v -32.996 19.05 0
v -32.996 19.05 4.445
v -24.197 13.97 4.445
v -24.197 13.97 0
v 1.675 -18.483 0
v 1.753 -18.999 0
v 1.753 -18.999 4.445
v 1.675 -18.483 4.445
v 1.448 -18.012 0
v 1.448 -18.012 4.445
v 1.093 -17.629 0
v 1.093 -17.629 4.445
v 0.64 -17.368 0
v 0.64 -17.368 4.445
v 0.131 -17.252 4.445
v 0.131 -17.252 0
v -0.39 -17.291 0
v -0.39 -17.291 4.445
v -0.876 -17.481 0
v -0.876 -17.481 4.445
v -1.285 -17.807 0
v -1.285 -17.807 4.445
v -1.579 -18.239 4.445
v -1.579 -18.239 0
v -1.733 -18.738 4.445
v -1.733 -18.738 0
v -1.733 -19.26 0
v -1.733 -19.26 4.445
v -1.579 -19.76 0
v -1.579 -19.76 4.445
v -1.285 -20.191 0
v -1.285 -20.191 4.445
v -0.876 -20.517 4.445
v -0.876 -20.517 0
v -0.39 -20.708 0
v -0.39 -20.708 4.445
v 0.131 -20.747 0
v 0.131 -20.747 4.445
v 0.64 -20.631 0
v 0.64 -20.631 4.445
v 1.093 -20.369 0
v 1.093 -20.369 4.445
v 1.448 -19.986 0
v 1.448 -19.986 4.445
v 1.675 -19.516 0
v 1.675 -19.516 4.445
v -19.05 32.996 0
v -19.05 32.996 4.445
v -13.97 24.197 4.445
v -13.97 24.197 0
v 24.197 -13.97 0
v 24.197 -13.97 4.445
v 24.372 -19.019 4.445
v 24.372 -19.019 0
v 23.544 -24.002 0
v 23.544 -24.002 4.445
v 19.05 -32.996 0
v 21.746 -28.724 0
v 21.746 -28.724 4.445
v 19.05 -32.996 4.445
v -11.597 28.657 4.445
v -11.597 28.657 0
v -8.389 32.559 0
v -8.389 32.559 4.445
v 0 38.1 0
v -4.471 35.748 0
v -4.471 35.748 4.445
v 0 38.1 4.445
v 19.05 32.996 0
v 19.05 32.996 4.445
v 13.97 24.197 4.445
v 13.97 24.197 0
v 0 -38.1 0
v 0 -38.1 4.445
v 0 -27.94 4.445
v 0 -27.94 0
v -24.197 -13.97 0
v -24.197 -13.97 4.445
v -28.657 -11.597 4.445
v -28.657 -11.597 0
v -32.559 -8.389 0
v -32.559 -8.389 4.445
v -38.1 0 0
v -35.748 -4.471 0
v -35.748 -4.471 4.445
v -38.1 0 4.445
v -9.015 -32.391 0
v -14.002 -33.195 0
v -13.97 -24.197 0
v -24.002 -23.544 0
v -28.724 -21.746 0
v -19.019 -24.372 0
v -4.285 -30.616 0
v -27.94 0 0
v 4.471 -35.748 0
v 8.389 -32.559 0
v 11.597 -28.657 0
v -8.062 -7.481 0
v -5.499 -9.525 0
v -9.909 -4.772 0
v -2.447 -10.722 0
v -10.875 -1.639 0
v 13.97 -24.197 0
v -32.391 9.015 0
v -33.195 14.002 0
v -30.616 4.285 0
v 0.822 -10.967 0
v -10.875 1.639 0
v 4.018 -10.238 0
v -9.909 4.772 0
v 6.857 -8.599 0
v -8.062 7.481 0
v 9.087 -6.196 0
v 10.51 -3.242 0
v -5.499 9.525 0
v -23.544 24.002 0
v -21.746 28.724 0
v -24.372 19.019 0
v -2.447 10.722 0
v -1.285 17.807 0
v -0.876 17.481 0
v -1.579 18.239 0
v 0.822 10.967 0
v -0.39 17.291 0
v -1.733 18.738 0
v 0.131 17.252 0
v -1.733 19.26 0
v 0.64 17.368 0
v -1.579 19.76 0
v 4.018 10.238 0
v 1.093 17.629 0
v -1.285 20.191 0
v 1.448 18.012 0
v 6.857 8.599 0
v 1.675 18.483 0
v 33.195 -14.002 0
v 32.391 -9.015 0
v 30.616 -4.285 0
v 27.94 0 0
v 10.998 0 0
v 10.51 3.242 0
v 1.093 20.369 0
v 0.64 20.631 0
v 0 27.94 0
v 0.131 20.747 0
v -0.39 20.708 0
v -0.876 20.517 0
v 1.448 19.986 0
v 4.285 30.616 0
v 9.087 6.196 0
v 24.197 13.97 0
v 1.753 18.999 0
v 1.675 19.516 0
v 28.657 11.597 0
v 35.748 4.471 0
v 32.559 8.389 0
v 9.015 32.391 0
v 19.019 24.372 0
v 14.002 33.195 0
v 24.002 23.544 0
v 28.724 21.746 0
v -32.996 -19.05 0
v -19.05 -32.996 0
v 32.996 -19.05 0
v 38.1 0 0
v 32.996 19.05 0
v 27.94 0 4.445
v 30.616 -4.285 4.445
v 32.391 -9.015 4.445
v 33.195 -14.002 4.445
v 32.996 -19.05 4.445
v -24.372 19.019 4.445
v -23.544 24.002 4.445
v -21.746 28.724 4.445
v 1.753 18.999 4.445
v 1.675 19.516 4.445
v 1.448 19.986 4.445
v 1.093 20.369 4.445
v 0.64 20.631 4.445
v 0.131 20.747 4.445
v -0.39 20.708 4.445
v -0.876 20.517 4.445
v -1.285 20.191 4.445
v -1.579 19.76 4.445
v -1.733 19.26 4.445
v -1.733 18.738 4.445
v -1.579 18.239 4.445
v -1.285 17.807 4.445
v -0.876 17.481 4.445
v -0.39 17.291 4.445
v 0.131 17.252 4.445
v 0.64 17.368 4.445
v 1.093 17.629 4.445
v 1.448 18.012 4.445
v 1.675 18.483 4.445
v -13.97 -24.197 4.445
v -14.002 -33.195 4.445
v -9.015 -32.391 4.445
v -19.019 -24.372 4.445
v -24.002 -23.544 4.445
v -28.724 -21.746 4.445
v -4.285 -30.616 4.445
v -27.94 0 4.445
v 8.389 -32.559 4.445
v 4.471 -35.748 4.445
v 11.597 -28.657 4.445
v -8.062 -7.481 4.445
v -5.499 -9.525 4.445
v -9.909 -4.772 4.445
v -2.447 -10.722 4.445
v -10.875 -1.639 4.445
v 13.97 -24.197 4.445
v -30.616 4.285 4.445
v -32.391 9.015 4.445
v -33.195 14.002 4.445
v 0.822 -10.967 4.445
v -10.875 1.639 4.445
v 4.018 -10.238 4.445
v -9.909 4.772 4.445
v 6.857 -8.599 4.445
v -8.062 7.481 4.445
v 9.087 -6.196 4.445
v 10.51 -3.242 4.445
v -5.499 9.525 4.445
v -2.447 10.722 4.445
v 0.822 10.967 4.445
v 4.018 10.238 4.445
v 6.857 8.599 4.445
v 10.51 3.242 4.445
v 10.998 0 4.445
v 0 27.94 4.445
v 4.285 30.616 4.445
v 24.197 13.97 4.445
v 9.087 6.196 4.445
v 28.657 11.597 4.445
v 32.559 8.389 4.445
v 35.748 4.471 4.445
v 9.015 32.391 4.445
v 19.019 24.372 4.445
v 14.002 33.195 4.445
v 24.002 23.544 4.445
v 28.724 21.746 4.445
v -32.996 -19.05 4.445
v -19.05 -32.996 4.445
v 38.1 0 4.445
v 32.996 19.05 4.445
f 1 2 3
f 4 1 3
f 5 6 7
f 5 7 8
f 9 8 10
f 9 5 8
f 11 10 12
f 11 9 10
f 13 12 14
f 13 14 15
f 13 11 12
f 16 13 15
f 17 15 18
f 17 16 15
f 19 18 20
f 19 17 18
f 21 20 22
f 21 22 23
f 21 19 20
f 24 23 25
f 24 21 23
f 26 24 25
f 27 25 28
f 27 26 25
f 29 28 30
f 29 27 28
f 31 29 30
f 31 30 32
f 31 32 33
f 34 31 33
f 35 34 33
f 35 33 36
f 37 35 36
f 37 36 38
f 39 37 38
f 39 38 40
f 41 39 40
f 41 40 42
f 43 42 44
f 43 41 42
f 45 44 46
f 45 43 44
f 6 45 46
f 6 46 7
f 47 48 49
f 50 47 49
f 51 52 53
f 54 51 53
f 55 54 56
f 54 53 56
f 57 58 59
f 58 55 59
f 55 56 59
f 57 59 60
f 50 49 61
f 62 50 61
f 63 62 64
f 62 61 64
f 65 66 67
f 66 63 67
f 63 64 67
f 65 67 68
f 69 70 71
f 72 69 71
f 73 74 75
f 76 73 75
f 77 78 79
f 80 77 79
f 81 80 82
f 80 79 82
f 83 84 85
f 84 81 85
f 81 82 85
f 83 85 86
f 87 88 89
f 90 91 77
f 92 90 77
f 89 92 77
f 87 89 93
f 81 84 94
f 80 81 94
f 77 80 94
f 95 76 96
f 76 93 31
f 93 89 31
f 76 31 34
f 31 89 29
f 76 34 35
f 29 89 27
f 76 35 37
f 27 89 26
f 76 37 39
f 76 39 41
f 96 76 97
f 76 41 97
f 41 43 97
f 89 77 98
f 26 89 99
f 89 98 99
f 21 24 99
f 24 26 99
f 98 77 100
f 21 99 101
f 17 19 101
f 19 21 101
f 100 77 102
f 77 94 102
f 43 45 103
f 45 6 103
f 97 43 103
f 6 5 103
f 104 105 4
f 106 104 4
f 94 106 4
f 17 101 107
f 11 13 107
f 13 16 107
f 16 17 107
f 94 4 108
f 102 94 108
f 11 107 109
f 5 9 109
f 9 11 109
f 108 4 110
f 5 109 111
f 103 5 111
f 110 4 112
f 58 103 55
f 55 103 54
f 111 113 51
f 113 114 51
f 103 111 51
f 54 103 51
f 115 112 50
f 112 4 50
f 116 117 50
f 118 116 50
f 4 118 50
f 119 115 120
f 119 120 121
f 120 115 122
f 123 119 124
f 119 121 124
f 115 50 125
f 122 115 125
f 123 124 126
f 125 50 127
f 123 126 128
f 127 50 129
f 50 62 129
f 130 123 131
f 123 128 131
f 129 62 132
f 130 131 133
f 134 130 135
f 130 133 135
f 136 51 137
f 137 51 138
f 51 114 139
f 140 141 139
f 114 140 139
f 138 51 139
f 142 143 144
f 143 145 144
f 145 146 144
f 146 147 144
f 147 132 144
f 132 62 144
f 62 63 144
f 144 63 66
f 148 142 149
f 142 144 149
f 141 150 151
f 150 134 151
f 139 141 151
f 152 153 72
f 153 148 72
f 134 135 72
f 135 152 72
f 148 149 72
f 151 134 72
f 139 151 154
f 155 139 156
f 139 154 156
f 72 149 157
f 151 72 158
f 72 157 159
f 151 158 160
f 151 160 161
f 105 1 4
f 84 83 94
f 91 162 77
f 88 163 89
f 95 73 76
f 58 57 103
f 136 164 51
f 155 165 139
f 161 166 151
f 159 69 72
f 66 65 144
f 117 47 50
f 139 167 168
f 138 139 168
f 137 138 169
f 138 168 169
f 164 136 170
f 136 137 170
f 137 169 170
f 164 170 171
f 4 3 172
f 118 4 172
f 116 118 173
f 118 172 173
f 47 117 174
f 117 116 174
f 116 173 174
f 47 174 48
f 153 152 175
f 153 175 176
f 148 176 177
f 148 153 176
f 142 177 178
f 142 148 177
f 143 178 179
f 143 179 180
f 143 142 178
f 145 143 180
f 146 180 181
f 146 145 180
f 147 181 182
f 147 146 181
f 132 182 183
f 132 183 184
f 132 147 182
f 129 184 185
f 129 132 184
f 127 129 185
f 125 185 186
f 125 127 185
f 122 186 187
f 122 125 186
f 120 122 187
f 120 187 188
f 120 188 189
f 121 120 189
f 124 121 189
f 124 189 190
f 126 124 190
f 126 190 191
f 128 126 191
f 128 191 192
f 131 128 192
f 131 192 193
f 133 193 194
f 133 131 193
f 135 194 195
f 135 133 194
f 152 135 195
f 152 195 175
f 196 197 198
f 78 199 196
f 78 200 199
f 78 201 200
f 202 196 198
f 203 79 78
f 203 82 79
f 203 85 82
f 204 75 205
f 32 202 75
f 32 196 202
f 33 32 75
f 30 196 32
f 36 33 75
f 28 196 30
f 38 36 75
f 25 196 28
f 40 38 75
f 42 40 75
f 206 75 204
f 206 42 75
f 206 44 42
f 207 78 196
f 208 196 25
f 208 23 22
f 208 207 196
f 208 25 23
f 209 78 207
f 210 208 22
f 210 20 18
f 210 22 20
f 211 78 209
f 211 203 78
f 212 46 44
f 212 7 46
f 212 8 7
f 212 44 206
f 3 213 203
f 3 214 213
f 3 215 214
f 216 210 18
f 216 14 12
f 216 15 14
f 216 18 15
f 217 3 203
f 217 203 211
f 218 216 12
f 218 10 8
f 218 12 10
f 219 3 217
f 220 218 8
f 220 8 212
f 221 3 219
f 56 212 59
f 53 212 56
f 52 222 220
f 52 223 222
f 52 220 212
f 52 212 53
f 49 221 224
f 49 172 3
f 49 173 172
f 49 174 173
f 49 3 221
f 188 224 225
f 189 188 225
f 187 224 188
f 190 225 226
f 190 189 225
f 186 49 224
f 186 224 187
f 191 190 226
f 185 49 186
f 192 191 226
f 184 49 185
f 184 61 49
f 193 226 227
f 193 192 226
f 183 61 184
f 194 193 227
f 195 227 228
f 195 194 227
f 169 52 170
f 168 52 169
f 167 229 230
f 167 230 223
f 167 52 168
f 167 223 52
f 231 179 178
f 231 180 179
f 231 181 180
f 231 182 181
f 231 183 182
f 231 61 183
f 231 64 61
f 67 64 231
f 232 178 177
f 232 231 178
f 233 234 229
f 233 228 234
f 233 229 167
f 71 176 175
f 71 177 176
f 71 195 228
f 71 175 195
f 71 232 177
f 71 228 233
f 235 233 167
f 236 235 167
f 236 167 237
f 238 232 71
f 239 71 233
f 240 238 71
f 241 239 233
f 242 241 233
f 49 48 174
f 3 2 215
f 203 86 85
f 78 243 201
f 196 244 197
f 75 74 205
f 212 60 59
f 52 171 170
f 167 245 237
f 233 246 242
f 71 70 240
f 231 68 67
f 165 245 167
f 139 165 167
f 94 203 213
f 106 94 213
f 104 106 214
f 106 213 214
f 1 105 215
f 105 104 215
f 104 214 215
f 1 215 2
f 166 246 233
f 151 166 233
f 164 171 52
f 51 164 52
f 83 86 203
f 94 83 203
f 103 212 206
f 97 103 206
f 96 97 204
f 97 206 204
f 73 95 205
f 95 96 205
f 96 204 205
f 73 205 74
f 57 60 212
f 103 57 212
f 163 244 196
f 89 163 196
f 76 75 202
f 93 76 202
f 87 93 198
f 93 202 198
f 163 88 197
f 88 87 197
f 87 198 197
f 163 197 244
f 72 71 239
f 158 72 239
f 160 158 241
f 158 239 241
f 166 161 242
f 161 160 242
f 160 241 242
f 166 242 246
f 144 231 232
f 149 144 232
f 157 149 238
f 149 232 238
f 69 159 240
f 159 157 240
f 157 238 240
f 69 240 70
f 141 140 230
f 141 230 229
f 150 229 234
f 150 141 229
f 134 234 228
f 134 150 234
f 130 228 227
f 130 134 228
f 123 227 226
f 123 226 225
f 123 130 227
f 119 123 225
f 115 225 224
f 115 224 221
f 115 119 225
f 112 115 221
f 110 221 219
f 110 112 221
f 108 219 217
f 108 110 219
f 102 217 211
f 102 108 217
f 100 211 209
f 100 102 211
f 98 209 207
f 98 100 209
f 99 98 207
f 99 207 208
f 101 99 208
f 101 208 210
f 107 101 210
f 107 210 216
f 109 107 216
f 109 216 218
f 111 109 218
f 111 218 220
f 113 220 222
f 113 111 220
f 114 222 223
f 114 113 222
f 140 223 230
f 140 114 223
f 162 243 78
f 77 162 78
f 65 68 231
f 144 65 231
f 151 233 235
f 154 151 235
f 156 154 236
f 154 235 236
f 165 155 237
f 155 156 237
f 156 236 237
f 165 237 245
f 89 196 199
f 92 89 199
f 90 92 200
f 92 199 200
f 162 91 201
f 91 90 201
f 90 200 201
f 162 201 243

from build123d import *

# Parameters (mm, degrees)
SKETCH1_R           = 38.1
SKETCH1_R_2         = 1.7526
SKETCH1_R_3         = 10.9982
BOSS_EXTRUDE1_DEPTH = 4.445
CUT_EXTRUDE1_DEPTH  = 55.064572735
CIRPATTERN1_COUNT   = 12


with BuildPart() as part:
    # Sketch1 → Boss-Extrude1 (new body)
    with BuildSketch(Plane.XY):
        Circle(SKETCH1_R)
        with Locations((0, 18.9992)):
            Circle(SKETCH1_R_2, mode=Mode.SUBTRACT)
        Circle(SKETCH1_R_3, mode=Mode.SUBTRACT)
        with Locations((0, -18.9992)):
            Circle(SKETCH1_R_2, mode=Mode.SUBTRACT)
    extrude(amount=BOSS_EXTRUDE1_DEPTH)

    # Sketch3 → Cut-Extrude1 (cut, through all)
    with BuildSketch(Plane.XY.offset(4.445)):
        with BuildLine():
            Line((-19.05, 32.995567884), (-13.97, 24.196749782))
            ThreePointArc((-13.97, 24.196749782), (-8.388518849, 32.558632061), (0, 38.1))
            ThreePointArc((0, 38.1), (-9.861005618, 36.801773982), (-19.05, 32.995567884))
        make_face()
    cut_extrude1 = extrude(amount=-CUT_EXTRUDE1_DEPTH, mode=Mode.SUBTRACT)

    # CirPattern1: Cut-Extrude1 ×12 about axis
    cirpattern1_axis = Axis((0, 0, 0), (0, 0, 1))
    for i in range(1, CIRPATTERN1_COUNT):
        add(cut_extrude1.rotate(cirpattern1_axis, i * 360 / CIRPATTERN1_COUNT), mode=Mode.SUBTRACT)


solid = part.part
